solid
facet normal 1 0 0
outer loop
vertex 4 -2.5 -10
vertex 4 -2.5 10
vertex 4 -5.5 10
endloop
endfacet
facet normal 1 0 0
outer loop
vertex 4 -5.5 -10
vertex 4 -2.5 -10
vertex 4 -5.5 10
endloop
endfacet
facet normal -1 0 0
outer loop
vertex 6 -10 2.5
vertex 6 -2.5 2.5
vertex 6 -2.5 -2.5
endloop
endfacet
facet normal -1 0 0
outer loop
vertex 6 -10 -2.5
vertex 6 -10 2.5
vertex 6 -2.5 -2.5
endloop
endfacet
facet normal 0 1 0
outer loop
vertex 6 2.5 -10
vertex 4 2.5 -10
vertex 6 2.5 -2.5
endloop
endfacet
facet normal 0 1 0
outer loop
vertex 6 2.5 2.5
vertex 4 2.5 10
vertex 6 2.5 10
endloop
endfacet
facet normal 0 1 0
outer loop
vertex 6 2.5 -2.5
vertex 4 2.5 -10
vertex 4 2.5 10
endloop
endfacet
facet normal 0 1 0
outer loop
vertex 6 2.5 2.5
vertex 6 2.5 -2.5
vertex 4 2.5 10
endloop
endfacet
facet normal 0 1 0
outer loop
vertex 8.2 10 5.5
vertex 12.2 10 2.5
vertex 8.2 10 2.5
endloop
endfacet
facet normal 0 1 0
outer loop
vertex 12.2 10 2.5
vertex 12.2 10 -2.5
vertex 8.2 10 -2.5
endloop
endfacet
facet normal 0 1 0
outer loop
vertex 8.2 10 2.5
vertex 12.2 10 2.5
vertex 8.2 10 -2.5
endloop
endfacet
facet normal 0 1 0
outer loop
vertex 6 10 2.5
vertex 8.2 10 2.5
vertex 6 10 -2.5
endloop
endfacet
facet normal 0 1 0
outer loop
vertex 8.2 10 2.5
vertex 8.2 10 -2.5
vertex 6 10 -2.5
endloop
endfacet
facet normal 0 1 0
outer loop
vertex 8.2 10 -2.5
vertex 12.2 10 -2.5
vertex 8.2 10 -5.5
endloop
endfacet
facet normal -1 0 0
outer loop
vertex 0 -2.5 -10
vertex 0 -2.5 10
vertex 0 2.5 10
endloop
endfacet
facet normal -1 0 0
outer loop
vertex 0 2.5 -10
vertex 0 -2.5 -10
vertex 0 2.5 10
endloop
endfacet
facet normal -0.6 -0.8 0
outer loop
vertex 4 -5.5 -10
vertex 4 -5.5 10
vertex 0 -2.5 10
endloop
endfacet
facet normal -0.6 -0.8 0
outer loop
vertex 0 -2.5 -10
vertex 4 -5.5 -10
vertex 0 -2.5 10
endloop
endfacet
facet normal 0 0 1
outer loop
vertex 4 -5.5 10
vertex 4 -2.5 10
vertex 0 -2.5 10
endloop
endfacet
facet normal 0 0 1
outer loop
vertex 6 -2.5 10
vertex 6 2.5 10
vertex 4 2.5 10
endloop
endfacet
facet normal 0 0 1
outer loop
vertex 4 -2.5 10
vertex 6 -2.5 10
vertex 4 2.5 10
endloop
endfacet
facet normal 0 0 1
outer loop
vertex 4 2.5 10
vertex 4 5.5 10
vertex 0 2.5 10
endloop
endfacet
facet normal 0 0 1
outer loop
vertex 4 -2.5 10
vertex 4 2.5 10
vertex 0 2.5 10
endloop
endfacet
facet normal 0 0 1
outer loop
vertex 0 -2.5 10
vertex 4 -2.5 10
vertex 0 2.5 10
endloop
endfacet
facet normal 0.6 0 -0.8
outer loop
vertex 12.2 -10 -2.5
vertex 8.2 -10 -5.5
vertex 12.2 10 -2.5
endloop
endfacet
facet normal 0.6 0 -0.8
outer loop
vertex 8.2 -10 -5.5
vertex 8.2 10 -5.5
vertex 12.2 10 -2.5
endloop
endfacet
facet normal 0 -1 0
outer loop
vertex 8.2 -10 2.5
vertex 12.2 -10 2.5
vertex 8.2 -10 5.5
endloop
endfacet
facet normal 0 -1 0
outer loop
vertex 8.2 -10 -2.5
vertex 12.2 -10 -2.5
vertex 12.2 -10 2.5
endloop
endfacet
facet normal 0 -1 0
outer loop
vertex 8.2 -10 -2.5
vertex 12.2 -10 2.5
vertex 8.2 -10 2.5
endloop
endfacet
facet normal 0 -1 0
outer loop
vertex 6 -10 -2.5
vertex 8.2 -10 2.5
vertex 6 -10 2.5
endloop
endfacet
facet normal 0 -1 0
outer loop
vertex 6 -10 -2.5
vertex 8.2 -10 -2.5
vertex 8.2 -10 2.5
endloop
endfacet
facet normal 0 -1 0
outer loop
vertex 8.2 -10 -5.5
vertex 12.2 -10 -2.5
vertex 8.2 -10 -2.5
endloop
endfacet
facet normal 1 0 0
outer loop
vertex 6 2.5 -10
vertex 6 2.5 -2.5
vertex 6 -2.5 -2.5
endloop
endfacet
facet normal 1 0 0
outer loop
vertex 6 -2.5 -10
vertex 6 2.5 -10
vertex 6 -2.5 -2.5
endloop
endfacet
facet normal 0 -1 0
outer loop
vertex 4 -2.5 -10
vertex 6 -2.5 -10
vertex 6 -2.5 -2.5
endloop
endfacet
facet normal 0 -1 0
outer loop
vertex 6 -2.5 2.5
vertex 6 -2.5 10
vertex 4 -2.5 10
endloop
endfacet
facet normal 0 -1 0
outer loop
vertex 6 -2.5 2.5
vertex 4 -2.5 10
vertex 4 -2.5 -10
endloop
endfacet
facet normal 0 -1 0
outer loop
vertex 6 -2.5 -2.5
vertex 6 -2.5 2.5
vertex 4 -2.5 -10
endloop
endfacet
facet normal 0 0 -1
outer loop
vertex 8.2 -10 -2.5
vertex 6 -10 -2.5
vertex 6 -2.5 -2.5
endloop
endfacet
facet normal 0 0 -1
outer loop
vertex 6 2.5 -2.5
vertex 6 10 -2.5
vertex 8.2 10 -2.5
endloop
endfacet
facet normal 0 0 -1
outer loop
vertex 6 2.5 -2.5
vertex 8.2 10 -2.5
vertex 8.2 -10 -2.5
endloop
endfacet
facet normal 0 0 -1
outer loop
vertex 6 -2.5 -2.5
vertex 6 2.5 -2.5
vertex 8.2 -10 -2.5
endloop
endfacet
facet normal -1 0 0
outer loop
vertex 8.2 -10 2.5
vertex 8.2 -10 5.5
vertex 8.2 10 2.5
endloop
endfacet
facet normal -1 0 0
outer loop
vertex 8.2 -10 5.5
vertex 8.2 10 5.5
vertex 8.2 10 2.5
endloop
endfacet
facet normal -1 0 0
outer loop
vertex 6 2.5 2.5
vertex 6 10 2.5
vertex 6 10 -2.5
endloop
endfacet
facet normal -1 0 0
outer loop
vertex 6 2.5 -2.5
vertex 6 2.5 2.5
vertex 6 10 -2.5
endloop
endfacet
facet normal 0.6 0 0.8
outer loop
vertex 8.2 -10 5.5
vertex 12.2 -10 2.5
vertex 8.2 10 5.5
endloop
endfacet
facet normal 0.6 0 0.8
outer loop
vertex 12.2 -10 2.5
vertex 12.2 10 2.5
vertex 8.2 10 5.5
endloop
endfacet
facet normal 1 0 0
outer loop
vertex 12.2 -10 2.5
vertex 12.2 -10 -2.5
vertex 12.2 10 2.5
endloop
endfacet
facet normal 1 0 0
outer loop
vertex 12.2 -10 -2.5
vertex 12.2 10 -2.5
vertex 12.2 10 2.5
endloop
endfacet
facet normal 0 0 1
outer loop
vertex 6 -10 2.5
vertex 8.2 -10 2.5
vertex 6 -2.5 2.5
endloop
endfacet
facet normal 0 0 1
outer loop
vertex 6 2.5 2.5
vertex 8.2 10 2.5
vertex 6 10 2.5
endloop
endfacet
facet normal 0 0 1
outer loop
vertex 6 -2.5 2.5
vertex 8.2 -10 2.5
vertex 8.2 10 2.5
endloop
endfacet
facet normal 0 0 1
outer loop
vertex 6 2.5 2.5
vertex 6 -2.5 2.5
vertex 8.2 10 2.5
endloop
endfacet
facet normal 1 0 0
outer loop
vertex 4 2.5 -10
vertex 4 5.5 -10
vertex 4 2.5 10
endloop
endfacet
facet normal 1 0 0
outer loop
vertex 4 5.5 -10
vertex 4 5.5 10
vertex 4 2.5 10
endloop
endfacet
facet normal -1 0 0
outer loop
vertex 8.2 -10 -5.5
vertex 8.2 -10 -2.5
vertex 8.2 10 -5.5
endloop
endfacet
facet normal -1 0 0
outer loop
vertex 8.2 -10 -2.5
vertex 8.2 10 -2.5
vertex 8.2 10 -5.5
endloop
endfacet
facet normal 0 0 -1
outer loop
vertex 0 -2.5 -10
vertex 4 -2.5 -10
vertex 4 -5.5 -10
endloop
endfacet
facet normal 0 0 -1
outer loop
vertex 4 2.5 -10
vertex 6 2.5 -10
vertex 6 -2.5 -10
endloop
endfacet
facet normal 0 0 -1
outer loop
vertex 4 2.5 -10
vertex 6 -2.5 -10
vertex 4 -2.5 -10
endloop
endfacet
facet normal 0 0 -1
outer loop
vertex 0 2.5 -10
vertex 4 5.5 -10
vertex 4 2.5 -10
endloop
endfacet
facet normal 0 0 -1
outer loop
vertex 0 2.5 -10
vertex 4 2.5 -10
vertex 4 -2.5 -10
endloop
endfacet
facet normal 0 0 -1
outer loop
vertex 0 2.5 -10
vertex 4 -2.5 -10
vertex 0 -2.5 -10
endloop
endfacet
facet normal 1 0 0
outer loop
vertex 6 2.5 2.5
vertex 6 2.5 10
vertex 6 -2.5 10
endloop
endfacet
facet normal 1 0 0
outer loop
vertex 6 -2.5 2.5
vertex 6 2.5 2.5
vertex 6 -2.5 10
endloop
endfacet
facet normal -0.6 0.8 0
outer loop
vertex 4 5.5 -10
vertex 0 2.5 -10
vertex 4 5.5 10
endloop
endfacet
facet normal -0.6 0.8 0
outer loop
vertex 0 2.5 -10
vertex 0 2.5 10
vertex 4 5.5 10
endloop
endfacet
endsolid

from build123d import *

# Parameters (mm, degrees)
BOSS_EXTRU_1_DEPTH = 10
BOSS_EXTRU_2_DEPTH = 10


with BuildPart() as part:
    # ProfileRainureEsquisse → Boss.-Extru.1 (new body, symmetric)
    with BuildSketch(Plane.XY):
        Polygon((0, -2.5), (0, 2.5), (4, 5.5), (4, 2.5), (6, 2.5), (6, -2.5), (4, -2.5), (4, -5.5), align=None)
    extrude(amount=BOSS_EXTRU_1_DEPTH, both=True)

    # Esquisse1 → Boss.-Extru.2 (add, symmetric)
    with BuildSketch(Plane(origin=(0, 0, 0), x_dir=(1, 0, 0), z_dir=(0, 1, 0))):
        Polygon((6, 2.5), (8.2, 2.5), (8.2, 5.5), (12.2, 2.5), (12.2, -2.5), (8.2, -5.5), (8.2, -2.5), (6, -2.5), align=None)
    extrude(amount=BOSS_EXTRU_2_DEPTH, both=True)


solid = part.part
